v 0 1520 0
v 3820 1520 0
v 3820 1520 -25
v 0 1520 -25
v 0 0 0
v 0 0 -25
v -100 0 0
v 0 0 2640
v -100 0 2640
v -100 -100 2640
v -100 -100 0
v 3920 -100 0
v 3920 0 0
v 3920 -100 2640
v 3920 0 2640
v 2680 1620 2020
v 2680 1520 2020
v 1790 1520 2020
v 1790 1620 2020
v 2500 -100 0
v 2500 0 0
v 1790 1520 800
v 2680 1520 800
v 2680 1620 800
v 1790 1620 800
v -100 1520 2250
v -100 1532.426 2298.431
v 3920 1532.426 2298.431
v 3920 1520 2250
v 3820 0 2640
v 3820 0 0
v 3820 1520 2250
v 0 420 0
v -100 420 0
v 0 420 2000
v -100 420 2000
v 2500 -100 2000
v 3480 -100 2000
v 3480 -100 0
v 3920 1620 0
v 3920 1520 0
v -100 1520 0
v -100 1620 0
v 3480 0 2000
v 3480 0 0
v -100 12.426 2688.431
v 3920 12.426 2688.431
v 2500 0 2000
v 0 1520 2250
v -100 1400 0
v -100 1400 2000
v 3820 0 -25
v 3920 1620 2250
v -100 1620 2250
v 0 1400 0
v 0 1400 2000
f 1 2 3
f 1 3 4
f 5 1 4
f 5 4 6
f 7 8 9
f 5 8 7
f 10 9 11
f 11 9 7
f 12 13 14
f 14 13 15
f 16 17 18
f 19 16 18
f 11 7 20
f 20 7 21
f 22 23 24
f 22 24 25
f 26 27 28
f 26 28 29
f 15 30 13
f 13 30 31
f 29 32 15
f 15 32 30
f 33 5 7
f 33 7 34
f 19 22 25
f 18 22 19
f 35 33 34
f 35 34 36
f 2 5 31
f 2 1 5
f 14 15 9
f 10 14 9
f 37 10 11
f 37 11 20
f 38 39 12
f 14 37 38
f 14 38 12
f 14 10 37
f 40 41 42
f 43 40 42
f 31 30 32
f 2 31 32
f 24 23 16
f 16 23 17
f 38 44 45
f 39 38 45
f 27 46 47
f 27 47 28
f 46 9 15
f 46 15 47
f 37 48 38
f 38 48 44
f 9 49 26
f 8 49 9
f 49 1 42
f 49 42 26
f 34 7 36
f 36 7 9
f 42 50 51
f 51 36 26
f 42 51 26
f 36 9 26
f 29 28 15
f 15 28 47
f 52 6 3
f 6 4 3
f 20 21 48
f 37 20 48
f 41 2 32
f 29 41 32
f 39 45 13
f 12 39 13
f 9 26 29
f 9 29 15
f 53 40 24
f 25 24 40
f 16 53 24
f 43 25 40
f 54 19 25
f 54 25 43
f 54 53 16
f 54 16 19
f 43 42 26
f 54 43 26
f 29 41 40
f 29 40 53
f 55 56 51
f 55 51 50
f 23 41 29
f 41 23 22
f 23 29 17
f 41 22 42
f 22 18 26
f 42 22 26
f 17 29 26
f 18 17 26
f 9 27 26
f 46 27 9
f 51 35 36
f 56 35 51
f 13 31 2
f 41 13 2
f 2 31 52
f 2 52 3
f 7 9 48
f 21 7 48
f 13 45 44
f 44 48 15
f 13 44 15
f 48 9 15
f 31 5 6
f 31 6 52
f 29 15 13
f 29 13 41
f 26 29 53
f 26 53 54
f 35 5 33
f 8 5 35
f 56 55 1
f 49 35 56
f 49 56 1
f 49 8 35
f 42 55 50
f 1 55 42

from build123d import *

# Parameters (mm, degrees)
F1_DEPTH  = 25
F5_DEPTH  = 100
F7_DEPTH  = 100
F9_DEPTH  = 100
F10_W     = 4020
F10_H     = 2250
F10_W_2   = 890
F10_H_2   = 1220
F11_DEPTH = 100
F13_DEPTH = 4020


with BuildPart() as f1:
    # F0 (on Top) → F1 (new body)
    with BuildSketch(Plane.XY):
        Polygon((0, 420), (0, 0), (2500, 0), (3480, 0), (3820, 0), (3820, 1520), (2680, 1520), (1790, 1520), (0, 1520), (0, 1400), align=None)
    extrude(amount=-F1_DEPTH)


with BuildPart() as f5:
    # F4 (on Right) → F5 (new body)
    with BuildSketch(Plane.YZ):
        Polygon((1400, 0), (1520, 0), (1520, 2250), (0, 2640), (0, 0), (420, 0), (420, 2000), (1400, 2000), align=None)
    extrude(amount=-F5_DEPTH)


with BuildPart() as f7:
    # F6 (on face) → F7 (new body)
    with BuildSketch(Plane.YZ.offset(3820)):
        Polygon((0, 2640), (0, 0), (1520, 0), (1520, 2250), align=None)
    extrude(amount=F7_DEPTH)


with BuildPart() as f9:
    # F8 (on Front) → F9 (new body)
    with BuildSketch(Plane.XZ):
        Polygon((3920, 2640), (-100, 2640), (-100, 0), (2500, 0), (2500, 2000), (3480, 2000), (3480, 0), (3920, 0), align=None)
    extrude(amount=F9_DEPTH)


with BuildPart() as f11:
    # F10 (on face) → F11 (new body)
    with BuildSketch(Plane(origin=(0, 1520, 0), x_dir=(-1, 0, 0), z_dir=(0, 1, 0))):
        with Locations((-1910, 1125)):
            Rectangle(F10_W, F10_H)
        with Locations((-2235, 1410)):
            Rectangle(F10_W_2, F10_H_2, mode=Mode.SUBTRACT)
    extrude(amount=F11_DEPTH)


with BuildPart() as f13:
    # F12 (on face) → F13 (new body, through all)
    with BuildSketch(Plane(origin=(-100, 0, 0), x_dir=(0, -1, 0), z_dir=(-1, 0, 0))):
        Polygon((-12.426433, 2688.431227), (-1532.426433, 2298.431227), (-1520, 2250), (0, 2640), align=None)
    extrude(amount=-F13_DEPTH)


solid = Compound([f1.part, f5.part, f7.part, f9.part, f11.part, f13.part])
